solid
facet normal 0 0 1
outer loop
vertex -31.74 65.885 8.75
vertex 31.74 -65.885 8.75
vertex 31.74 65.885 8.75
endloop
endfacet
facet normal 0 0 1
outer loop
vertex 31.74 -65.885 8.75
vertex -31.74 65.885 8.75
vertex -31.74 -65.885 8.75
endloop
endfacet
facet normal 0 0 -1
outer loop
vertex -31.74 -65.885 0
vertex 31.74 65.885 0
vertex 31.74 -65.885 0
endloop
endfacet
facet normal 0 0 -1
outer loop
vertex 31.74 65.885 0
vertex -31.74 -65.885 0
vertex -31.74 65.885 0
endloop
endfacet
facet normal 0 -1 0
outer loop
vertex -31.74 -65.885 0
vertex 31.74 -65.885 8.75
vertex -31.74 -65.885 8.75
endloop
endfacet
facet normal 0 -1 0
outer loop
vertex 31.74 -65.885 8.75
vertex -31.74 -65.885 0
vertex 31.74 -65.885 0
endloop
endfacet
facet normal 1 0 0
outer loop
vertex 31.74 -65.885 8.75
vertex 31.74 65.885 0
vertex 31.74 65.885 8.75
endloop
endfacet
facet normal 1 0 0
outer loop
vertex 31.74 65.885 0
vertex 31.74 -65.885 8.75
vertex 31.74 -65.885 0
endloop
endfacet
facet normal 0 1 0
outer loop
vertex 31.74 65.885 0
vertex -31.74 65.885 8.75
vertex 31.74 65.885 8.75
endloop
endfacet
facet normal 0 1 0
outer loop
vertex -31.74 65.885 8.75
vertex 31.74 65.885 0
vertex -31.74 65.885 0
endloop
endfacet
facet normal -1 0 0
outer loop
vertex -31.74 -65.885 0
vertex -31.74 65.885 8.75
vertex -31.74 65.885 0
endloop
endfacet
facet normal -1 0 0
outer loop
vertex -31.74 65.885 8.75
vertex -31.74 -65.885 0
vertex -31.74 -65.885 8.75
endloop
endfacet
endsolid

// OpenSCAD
/*
 * bq Aquaris A4.5 mock-up
 */

// bq provided dimensions:
width = 63.48;
height = 131.77;
depth = 8.75;

translate([-width/2,-height/2,0]){
	cube([width,height,depth]);
}
